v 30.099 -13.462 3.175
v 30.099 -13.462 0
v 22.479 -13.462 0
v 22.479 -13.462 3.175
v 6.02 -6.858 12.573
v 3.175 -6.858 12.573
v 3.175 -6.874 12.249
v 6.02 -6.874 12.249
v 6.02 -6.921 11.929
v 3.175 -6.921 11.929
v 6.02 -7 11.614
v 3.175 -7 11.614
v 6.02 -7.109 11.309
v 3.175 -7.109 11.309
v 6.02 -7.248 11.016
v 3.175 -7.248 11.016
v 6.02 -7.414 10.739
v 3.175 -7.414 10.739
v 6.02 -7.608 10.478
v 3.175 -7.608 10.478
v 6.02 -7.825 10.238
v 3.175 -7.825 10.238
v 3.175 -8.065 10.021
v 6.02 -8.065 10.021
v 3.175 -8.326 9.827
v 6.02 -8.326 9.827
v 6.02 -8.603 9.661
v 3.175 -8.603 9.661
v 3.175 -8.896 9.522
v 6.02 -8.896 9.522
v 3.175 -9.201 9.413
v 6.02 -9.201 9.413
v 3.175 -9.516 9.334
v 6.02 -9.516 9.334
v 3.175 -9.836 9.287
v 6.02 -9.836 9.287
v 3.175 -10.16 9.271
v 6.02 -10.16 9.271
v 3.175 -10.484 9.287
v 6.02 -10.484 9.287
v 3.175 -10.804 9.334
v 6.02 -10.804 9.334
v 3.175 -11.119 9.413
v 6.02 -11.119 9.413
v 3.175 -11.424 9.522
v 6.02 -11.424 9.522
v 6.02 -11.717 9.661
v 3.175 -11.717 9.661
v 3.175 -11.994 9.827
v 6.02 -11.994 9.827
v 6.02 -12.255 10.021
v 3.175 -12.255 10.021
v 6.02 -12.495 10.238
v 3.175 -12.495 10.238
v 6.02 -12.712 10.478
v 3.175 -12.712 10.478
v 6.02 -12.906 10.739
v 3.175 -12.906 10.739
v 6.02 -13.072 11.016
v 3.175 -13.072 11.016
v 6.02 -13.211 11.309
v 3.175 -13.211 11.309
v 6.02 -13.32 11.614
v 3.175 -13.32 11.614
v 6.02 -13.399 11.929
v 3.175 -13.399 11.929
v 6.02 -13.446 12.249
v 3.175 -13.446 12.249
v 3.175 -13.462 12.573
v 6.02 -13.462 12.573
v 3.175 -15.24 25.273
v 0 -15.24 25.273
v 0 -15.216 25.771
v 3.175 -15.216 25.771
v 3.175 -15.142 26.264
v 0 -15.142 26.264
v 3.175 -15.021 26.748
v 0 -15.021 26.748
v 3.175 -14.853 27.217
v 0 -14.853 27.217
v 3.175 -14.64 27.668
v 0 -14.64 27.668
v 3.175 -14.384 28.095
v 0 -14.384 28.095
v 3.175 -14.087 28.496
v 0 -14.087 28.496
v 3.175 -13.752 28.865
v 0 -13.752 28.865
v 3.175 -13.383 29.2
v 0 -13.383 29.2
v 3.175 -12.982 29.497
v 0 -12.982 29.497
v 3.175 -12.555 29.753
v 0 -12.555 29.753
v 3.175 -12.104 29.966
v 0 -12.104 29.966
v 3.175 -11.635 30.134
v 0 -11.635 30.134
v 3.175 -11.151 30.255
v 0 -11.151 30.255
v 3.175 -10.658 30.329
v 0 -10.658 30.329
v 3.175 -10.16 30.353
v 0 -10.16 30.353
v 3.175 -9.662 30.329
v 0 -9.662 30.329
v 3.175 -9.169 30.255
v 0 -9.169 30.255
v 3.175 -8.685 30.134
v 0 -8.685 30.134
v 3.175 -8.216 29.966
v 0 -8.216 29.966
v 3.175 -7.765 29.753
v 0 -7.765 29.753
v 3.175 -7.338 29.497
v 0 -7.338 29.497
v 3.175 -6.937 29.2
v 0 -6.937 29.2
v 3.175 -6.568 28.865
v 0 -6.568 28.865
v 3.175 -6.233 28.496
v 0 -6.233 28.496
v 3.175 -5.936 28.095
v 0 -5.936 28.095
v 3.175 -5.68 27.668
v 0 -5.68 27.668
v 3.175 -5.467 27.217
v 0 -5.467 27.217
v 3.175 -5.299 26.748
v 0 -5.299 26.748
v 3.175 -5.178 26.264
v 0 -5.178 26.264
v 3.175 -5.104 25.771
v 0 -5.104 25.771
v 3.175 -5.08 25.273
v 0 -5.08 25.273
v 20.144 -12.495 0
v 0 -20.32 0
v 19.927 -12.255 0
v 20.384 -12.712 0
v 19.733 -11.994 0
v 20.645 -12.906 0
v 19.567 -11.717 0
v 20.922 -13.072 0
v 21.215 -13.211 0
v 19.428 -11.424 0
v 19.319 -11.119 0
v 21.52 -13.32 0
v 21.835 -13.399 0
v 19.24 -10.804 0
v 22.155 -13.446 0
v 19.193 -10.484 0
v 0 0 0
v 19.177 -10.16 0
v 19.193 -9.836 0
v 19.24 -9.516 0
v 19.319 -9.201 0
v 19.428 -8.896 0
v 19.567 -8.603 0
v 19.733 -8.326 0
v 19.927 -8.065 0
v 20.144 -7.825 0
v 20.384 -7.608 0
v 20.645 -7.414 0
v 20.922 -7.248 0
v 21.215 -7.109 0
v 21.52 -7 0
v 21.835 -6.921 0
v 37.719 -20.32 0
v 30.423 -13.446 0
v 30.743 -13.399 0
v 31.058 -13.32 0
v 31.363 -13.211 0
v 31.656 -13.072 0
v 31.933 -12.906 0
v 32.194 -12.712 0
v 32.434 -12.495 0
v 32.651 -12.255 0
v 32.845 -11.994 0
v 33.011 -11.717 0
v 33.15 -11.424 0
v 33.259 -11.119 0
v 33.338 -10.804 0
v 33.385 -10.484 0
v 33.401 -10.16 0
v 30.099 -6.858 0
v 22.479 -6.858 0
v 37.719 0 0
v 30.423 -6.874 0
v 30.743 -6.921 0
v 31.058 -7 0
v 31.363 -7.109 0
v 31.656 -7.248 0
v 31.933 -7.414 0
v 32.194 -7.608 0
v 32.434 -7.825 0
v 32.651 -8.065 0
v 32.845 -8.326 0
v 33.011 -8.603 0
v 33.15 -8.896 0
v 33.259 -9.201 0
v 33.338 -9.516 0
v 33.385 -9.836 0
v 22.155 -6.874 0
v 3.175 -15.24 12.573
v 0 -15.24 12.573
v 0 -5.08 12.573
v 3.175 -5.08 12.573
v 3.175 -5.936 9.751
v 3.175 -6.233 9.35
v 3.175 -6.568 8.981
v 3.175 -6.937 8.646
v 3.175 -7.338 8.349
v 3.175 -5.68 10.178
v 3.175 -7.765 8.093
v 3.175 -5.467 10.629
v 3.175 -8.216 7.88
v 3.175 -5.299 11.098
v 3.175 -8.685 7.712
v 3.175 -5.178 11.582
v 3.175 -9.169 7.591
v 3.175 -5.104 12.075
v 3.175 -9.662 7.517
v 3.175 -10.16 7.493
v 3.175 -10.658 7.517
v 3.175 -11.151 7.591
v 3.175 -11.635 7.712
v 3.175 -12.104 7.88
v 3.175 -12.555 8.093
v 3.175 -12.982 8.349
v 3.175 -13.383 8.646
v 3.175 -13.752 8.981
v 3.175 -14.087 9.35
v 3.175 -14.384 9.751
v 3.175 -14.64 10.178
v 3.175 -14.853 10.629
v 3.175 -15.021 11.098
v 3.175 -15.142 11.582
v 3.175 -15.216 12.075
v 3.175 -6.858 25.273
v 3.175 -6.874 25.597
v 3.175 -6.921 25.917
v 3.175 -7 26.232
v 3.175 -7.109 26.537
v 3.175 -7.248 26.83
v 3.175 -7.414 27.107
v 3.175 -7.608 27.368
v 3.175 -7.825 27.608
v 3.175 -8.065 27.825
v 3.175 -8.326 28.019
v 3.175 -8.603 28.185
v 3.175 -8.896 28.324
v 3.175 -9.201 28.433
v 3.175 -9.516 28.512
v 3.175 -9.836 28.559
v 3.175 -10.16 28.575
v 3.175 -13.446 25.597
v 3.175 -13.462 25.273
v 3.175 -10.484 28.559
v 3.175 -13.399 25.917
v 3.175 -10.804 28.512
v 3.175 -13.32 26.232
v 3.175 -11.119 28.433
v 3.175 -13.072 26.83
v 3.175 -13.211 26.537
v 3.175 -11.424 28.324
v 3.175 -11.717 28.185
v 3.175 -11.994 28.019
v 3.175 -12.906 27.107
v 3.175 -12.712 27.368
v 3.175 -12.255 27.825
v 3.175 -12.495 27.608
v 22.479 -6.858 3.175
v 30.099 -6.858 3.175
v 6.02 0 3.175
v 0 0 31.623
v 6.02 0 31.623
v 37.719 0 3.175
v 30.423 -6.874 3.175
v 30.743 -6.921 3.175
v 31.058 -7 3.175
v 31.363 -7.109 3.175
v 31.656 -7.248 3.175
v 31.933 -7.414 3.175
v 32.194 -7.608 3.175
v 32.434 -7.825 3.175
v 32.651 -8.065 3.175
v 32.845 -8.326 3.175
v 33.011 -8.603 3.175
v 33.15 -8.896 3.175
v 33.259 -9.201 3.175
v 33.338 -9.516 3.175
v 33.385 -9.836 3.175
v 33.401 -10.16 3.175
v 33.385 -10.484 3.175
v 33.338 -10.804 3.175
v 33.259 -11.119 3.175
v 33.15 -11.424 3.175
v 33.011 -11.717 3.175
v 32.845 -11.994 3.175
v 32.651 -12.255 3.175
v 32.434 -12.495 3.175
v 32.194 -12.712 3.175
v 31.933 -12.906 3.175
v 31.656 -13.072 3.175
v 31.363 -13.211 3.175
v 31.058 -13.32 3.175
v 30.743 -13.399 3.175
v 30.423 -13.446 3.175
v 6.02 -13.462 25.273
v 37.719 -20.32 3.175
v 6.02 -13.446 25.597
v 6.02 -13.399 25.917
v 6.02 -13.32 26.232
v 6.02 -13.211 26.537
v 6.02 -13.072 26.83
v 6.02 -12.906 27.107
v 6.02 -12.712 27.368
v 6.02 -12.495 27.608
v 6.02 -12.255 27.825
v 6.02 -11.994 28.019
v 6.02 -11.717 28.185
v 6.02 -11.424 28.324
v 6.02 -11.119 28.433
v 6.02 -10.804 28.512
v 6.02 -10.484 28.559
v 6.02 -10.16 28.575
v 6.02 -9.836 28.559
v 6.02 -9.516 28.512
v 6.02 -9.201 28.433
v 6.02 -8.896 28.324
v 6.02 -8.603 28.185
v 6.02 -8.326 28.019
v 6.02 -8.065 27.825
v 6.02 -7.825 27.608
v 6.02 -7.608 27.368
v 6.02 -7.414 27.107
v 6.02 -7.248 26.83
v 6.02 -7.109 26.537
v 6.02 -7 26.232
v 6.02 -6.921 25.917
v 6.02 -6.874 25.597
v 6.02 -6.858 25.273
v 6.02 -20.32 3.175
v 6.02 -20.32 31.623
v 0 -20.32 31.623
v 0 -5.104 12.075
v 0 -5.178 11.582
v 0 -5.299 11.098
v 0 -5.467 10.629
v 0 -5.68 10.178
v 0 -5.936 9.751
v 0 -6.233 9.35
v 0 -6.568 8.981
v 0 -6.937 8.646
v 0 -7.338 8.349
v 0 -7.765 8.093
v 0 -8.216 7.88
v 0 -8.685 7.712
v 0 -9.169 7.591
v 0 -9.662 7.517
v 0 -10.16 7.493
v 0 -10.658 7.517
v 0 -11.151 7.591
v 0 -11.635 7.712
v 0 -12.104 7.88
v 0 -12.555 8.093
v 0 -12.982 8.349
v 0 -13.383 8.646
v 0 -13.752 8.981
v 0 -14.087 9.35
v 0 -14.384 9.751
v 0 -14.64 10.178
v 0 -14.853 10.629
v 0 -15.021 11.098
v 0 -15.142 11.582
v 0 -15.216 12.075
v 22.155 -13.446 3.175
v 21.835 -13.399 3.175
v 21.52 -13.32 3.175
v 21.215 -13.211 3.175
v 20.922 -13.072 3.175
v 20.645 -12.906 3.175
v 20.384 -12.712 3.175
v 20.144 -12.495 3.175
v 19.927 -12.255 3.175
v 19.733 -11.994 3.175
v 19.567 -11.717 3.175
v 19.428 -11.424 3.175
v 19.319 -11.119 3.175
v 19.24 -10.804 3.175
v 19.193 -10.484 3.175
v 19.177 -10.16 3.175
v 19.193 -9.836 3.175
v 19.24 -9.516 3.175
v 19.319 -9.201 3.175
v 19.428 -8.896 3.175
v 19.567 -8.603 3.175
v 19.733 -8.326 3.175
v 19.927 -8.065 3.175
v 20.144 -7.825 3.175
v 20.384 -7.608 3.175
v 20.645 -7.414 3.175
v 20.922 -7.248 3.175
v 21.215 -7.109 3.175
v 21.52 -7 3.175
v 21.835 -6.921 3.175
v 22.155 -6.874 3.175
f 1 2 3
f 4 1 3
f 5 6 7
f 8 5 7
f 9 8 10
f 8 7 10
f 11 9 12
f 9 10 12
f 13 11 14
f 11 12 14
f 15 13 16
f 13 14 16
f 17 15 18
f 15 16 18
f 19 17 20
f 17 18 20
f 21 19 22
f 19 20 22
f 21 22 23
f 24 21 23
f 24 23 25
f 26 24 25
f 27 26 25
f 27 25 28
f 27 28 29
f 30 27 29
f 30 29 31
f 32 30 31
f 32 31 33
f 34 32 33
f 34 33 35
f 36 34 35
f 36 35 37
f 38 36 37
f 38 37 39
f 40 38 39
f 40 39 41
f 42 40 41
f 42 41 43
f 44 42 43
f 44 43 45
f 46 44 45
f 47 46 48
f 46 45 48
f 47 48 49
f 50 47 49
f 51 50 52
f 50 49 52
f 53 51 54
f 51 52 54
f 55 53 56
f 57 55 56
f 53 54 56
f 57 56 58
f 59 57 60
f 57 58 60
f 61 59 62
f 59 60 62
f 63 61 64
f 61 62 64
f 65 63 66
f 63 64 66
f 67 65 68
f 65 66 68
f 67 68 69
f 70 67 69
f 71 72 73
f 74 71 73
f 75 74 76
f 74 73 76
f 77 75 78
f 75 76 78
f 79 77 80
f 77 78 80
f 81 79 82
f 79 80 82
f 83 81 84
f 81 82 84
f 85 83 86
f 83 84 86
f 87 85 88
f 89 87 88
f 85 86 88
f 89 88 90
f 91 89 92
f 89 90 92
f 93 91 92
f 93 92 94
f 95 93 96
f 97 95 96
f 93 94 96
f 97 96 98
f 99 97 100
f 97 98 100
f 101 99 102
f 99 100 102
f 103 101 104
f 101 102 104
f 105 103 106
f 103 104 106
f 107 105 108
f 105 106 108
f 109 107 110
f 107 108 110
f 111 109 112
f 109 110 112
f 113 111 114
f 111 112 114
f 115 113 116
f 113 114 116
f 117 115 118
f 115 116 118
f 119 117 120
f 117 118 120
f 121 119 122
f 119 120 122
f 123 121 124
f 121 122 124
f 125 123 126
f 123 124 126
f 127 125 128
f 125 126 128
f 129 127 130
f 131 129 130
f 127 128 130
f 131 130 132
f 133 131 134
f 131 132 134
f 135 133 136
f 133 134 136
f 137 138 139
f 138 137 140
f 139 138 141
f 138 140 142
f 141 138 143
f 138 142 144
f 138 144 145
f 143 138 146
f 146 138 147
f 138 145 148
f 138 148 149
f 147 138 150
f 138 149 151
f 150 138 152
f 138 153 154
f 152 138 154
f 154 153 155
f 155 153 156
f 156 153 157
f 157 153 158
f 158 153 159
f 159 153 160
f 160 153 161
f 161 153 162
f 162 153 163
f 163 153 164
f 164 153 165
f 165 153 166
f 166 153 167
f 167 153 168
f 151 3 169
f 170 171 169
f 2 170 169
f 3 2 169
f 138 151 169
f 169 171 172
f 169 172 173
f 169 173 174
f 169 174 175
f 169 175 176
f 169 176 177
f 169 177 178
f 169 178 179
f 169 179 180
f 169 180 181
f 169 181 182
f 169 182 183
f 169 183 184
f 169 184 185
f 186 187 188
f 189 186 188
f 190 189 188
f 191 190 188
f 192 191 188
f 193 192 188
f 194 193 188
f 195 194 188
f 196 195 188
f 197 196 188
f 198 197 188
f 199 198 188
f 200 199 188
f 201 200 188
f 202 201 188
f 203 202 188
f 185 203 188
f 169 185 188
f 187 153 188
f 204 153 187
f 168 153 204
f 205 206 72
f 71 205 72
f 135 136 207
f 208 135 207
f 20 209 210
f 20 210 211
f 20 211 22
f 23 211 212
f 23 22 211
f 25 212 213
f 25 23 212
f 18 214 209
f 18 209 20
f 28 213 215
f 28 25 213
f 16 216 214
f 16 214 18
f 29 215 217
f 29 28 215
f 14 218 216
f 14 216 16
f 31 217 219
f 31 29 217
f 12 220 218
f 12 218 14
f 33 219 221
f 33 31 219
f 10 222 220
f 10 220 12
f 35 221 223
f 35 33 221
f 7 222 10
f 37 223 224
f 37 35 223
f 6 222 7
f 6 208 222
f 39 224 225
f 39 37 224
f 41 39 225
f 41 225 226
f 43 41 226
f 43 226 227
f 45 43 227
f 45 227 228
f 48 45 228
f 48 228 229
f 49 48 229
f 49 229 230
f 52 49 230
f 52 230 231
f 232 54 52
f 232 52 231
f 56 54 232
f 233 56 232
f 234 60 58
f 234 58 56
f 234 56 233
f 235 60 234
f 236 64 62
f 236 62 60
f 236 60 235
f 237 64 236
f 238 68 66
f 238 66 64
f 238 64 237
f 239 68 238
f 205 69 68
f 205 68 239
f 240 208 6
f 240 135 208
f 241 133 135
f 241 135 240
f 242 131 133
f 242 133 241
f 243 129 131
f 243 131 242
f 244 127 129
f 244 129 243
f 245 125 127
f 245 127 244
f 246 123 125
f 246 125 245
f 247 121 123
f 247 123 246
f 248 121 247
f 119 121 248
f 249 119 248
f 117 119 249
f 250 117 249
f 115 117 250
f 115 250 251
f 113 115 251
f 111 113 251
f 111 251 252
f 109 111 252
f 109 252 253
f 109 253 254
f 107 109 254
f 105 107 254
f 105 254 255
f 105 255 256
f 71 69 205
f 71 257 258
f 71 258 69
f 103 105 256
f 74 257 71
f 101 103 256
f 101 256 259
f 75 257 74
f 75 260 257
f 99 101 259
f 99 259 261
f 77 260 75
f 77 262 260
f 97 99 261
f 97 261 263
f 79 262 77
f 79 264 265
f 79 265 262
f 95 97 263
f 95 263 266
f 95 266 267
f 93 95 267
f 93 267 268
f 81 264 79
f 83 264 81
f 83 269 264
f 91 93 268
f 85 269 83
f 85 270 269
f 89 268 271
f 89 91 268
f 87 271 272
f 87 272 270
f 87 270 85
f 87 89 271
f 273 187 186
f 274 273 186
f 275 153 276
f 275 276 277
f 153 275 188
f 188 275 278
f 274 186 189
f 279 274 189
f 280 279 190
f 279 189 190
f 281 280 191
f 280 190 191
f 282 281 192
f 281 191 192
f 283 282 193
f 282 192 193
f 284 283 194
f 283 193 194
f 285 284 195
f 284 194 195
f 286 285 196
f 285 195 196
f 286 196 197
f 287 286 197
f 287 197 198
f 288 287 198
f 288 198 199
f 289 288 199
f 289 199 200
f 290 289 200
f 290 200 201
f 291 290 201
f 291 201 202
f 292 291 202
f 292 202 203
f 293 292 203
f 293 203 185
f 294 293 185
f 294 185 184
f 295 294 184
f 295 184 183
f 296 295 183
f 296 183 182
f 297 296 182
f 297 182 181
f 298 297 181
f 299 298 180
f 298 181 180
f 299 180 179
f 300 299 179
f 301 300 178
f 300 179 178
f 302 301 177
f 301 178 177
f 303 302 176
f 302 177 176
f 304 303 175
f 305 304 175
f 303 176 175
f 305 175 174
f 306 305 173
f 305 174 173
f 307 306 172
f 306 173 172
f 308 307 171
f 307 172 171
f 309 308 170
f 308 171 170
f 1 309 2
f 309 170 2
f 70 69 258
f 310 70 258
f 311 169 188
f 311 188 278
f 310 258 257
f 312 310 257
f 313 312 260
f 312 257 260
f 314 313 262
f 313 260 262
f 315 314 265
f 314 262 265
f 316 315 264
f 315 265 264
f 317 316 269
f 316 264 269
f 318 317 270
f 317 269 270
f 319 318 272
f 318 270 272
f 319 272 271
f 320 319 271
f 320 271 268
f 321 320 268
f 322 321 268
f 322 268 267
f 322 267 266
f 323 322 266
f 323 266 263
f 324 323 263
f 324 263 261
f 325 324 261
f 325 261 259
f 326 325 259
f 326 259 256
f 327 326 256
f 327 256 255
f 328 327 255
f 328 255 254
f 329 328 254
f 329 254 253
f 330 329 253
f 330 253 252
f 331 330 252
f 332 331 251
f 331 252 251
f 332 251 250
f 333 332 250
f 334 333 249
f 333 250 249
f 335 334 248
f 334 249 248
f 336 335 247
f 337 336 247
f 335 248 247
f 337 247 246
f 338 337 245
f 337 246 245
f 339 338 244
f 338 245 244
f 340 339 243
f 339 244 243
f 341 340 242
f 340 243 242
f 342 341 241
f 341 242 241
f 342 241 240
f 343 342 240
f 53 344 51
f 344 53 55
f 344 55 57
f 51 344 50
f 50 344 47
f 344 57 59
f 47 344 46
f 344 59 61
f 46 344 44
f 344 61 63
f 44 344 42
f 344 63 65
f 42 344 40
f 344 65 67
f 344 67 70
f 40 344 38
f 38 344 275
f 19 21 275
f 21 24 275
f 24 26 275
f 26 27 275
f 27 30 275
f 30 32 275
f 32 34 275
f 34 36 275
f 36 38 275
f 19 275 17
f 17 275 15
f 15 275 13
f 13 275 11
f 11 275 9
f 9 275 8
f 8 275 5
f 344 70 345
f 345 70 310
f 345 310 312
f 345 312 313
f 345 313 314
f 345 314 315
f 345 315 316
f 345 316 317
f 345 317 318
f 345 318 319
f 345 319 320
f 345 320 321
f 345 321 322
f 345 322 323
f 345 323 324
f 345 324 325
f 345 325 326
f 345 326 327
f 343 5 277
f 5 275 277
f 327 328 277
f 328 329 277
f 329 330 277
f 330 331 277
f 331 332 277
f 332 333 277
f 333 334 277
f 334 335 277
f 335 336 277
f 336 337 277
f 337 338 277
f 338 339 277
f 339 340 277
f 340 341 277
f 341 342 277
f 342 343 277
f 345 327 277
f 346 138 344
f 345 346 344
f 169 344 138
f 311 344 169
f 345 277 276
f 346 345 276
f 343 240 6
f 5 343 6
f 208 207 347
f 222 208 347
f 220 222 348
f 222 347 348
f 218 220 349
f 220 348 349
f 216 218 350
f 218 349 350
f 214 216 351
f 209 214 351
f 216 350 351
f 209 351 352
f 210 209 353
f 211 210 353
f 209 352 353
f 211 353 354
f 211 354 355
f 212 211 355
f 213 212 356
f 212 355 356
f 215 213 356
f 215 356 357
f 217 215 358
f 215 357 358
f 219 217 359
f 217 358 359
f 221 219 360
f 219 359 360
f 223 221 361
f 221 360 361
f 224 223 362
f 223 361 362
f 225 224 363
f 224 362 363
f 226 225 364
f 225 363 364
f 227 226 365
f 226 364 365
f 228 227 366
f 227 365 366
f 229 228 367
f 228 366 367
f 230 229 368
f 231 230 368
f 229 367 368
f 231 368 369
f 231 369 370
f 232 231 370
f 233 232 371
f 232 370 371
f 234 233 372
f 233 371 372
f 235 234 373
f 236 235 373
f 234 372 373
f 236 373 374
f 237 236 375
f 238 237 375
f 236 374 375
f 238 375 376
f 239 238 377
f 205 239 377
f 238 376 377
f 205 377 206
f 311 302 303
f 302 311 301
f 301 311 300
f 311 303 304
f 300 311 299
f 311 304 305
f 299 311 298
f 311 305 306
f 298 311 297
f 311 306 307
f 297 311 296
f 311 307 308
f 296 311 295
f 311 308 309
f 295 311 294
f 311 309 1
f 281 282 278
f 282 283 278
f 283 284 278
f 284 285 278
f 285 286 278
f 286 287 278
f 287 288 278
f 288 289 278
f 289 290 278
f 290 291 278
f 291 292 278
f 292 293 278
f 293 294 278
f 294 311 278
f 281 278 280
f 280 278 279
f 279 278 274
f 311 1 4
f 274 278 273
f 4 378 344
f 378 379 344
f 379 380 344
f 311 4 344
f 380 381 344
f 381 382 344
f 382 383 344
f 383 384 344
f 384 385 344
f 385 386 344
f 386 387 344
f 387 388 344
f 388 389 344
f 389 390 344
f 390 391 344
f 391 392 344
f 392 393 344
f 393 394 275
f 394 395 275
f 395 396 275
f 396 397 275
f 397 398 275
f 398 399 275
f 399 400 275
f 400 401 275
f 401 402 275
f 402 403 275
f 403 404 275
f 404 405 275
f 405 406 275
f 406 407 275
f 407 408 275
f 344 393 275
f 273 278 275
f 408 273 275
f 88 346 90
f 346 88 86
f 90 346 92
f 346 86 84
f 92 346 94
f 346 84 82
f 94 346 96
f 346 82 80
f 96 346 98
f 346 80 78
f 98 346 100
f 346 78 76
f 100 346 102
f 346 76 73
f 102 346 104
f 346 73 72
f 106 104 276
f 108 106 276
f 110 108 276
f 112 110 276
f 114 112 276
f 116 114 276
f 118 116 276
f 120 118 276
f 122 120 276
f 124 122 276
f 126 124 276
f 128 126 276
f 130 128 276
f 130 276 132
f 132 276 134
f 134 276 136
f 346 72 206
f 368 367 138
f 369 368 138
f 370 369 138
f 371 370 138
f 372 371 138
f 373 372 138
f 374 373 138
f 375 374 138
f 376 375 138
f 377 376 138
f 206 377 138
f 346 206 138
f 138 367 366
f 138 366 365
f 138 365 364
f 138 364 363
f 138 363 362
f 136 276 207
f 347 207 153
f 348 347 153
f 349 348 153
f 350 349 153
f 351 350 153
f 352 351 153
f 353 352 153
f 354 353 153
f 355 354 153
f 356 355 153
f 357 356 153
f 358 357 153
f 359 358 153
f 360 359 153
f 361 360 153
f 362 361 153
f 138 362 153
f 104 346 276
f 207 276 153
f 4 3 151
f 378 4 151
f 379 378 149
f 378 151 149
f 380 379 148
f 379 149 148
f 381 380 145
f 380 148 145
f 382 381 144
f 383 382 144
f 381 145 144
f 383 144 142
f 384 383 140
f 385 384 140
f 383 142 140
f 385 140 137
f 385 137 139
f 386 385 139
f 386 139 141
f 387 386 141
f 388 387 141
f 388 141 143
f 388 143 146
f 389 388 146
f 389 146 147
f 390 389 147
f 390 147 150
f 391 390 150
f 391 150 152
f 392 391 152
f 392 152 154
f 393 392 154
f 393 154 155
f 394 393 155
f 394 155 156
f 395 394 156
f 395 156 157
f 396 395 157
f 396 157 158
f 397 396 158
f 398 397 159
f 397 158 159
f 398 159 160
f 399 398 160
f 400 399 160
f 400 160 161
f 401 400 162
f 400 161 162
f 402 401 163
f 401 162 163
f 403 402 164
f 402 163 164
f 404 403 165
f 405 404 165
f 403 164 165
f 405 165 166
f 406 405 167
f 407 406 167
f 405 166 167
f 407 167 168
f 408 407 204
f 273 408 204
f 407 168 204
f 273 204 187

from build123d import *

# Parameters (mm, degrees)
F1_DEPTH = 20.32
F3_DEPTH = 15.24
F5_DEPTH = 25.4
F6_DEPTH = 3.175


with BuildPart() as f1:
    # F0 (on Front) → F1 (new body)
    with BuildSketch(Plane.XZ):
        Polygon((0, 31.623), (0, 0), (37.719, 0), (37.719, 3.175), (6.0198, 3.175), (6.0198, 31.623), align=None)
    extrude(amount=F1_DEPTH)

    # F2 (on face) → F3 (cut)
    with BuildSketch(Plane(origin=(0, 0, 0), x_dir=(1, 0, 0), z_dir=(0, 0, -1))):
        with BuildLine():
            Line((22.479, 6.858), (30.099, 6.858))
            ThreePointArc((30.099, 6.858), (33.401, 10.16), (30.099, 13.462))
            Line((30.099, 13.462), (22.479, 13.462))
            ThreePointArc((22.479, 13.462), (19.177, 10.16), (22.479, 6.858))
        make_face()
    extrude(amount=-F3_DEPTH, mode=Mode.SUBTRACT)

    # F4 (on face) → F5 (cut)
    with BuildSketch(Plane(origin=(0, 0, 0), x_dir=(0, -1, 0), z_dir=(-1, 0, 0))):
        with BuildLine():
            Line((13.462, 12.573), (13.462, 25.273))
            ThreePointArc((13.462, 25.273), (10.16, 28.575), (6.858, 25.273))
            Line((6.858, 25.273), (6.858, 12.573))
            ThreePointArc((6.858, 12.573), (10.16, 9.271), (13.462, 12.573))
        make_face()
    extrude(amount=-F5_DEPTH, mode=Mode.SUBTRACT)

    # F4 (on face) → F6 (cut)
    with BuildSketch(Plane(origin=(0, 0, 0), x_dir=(0, -1, 0), z_dir=(-1, 0, 0))):
        with BuildLine():
            Line((15.24, 12.573), (15.24, 25.273))
            ThreePointArc((15.24, 25.273), (10.16, 30.353), (5.08, 25.273))
            Line((5.08, 25.273), (5.08, 12.573))
            ThreePointArc((5.08, 12.573), (10.16, 7.493), (15.24, 12.573))
        make_face()
        with BuildLine():
            ThreePointArc((6.858, 25.273), (10.16, 28.575), (13.462, 25.273))
            Line((13.462, 25.273), (13.462, 12.573))
            ThreePointArc((13.462, 12.573), (10.16, 9.271), (6.858, 12.573))
            Line((6.858, 12.573), (6.858, 25.273))
        make_face(mode=Mode.SUBTRACT)
    extrude(amount=-F6_DEPTH, mode=Mode.SUBTRACT)


solid = f1.part
